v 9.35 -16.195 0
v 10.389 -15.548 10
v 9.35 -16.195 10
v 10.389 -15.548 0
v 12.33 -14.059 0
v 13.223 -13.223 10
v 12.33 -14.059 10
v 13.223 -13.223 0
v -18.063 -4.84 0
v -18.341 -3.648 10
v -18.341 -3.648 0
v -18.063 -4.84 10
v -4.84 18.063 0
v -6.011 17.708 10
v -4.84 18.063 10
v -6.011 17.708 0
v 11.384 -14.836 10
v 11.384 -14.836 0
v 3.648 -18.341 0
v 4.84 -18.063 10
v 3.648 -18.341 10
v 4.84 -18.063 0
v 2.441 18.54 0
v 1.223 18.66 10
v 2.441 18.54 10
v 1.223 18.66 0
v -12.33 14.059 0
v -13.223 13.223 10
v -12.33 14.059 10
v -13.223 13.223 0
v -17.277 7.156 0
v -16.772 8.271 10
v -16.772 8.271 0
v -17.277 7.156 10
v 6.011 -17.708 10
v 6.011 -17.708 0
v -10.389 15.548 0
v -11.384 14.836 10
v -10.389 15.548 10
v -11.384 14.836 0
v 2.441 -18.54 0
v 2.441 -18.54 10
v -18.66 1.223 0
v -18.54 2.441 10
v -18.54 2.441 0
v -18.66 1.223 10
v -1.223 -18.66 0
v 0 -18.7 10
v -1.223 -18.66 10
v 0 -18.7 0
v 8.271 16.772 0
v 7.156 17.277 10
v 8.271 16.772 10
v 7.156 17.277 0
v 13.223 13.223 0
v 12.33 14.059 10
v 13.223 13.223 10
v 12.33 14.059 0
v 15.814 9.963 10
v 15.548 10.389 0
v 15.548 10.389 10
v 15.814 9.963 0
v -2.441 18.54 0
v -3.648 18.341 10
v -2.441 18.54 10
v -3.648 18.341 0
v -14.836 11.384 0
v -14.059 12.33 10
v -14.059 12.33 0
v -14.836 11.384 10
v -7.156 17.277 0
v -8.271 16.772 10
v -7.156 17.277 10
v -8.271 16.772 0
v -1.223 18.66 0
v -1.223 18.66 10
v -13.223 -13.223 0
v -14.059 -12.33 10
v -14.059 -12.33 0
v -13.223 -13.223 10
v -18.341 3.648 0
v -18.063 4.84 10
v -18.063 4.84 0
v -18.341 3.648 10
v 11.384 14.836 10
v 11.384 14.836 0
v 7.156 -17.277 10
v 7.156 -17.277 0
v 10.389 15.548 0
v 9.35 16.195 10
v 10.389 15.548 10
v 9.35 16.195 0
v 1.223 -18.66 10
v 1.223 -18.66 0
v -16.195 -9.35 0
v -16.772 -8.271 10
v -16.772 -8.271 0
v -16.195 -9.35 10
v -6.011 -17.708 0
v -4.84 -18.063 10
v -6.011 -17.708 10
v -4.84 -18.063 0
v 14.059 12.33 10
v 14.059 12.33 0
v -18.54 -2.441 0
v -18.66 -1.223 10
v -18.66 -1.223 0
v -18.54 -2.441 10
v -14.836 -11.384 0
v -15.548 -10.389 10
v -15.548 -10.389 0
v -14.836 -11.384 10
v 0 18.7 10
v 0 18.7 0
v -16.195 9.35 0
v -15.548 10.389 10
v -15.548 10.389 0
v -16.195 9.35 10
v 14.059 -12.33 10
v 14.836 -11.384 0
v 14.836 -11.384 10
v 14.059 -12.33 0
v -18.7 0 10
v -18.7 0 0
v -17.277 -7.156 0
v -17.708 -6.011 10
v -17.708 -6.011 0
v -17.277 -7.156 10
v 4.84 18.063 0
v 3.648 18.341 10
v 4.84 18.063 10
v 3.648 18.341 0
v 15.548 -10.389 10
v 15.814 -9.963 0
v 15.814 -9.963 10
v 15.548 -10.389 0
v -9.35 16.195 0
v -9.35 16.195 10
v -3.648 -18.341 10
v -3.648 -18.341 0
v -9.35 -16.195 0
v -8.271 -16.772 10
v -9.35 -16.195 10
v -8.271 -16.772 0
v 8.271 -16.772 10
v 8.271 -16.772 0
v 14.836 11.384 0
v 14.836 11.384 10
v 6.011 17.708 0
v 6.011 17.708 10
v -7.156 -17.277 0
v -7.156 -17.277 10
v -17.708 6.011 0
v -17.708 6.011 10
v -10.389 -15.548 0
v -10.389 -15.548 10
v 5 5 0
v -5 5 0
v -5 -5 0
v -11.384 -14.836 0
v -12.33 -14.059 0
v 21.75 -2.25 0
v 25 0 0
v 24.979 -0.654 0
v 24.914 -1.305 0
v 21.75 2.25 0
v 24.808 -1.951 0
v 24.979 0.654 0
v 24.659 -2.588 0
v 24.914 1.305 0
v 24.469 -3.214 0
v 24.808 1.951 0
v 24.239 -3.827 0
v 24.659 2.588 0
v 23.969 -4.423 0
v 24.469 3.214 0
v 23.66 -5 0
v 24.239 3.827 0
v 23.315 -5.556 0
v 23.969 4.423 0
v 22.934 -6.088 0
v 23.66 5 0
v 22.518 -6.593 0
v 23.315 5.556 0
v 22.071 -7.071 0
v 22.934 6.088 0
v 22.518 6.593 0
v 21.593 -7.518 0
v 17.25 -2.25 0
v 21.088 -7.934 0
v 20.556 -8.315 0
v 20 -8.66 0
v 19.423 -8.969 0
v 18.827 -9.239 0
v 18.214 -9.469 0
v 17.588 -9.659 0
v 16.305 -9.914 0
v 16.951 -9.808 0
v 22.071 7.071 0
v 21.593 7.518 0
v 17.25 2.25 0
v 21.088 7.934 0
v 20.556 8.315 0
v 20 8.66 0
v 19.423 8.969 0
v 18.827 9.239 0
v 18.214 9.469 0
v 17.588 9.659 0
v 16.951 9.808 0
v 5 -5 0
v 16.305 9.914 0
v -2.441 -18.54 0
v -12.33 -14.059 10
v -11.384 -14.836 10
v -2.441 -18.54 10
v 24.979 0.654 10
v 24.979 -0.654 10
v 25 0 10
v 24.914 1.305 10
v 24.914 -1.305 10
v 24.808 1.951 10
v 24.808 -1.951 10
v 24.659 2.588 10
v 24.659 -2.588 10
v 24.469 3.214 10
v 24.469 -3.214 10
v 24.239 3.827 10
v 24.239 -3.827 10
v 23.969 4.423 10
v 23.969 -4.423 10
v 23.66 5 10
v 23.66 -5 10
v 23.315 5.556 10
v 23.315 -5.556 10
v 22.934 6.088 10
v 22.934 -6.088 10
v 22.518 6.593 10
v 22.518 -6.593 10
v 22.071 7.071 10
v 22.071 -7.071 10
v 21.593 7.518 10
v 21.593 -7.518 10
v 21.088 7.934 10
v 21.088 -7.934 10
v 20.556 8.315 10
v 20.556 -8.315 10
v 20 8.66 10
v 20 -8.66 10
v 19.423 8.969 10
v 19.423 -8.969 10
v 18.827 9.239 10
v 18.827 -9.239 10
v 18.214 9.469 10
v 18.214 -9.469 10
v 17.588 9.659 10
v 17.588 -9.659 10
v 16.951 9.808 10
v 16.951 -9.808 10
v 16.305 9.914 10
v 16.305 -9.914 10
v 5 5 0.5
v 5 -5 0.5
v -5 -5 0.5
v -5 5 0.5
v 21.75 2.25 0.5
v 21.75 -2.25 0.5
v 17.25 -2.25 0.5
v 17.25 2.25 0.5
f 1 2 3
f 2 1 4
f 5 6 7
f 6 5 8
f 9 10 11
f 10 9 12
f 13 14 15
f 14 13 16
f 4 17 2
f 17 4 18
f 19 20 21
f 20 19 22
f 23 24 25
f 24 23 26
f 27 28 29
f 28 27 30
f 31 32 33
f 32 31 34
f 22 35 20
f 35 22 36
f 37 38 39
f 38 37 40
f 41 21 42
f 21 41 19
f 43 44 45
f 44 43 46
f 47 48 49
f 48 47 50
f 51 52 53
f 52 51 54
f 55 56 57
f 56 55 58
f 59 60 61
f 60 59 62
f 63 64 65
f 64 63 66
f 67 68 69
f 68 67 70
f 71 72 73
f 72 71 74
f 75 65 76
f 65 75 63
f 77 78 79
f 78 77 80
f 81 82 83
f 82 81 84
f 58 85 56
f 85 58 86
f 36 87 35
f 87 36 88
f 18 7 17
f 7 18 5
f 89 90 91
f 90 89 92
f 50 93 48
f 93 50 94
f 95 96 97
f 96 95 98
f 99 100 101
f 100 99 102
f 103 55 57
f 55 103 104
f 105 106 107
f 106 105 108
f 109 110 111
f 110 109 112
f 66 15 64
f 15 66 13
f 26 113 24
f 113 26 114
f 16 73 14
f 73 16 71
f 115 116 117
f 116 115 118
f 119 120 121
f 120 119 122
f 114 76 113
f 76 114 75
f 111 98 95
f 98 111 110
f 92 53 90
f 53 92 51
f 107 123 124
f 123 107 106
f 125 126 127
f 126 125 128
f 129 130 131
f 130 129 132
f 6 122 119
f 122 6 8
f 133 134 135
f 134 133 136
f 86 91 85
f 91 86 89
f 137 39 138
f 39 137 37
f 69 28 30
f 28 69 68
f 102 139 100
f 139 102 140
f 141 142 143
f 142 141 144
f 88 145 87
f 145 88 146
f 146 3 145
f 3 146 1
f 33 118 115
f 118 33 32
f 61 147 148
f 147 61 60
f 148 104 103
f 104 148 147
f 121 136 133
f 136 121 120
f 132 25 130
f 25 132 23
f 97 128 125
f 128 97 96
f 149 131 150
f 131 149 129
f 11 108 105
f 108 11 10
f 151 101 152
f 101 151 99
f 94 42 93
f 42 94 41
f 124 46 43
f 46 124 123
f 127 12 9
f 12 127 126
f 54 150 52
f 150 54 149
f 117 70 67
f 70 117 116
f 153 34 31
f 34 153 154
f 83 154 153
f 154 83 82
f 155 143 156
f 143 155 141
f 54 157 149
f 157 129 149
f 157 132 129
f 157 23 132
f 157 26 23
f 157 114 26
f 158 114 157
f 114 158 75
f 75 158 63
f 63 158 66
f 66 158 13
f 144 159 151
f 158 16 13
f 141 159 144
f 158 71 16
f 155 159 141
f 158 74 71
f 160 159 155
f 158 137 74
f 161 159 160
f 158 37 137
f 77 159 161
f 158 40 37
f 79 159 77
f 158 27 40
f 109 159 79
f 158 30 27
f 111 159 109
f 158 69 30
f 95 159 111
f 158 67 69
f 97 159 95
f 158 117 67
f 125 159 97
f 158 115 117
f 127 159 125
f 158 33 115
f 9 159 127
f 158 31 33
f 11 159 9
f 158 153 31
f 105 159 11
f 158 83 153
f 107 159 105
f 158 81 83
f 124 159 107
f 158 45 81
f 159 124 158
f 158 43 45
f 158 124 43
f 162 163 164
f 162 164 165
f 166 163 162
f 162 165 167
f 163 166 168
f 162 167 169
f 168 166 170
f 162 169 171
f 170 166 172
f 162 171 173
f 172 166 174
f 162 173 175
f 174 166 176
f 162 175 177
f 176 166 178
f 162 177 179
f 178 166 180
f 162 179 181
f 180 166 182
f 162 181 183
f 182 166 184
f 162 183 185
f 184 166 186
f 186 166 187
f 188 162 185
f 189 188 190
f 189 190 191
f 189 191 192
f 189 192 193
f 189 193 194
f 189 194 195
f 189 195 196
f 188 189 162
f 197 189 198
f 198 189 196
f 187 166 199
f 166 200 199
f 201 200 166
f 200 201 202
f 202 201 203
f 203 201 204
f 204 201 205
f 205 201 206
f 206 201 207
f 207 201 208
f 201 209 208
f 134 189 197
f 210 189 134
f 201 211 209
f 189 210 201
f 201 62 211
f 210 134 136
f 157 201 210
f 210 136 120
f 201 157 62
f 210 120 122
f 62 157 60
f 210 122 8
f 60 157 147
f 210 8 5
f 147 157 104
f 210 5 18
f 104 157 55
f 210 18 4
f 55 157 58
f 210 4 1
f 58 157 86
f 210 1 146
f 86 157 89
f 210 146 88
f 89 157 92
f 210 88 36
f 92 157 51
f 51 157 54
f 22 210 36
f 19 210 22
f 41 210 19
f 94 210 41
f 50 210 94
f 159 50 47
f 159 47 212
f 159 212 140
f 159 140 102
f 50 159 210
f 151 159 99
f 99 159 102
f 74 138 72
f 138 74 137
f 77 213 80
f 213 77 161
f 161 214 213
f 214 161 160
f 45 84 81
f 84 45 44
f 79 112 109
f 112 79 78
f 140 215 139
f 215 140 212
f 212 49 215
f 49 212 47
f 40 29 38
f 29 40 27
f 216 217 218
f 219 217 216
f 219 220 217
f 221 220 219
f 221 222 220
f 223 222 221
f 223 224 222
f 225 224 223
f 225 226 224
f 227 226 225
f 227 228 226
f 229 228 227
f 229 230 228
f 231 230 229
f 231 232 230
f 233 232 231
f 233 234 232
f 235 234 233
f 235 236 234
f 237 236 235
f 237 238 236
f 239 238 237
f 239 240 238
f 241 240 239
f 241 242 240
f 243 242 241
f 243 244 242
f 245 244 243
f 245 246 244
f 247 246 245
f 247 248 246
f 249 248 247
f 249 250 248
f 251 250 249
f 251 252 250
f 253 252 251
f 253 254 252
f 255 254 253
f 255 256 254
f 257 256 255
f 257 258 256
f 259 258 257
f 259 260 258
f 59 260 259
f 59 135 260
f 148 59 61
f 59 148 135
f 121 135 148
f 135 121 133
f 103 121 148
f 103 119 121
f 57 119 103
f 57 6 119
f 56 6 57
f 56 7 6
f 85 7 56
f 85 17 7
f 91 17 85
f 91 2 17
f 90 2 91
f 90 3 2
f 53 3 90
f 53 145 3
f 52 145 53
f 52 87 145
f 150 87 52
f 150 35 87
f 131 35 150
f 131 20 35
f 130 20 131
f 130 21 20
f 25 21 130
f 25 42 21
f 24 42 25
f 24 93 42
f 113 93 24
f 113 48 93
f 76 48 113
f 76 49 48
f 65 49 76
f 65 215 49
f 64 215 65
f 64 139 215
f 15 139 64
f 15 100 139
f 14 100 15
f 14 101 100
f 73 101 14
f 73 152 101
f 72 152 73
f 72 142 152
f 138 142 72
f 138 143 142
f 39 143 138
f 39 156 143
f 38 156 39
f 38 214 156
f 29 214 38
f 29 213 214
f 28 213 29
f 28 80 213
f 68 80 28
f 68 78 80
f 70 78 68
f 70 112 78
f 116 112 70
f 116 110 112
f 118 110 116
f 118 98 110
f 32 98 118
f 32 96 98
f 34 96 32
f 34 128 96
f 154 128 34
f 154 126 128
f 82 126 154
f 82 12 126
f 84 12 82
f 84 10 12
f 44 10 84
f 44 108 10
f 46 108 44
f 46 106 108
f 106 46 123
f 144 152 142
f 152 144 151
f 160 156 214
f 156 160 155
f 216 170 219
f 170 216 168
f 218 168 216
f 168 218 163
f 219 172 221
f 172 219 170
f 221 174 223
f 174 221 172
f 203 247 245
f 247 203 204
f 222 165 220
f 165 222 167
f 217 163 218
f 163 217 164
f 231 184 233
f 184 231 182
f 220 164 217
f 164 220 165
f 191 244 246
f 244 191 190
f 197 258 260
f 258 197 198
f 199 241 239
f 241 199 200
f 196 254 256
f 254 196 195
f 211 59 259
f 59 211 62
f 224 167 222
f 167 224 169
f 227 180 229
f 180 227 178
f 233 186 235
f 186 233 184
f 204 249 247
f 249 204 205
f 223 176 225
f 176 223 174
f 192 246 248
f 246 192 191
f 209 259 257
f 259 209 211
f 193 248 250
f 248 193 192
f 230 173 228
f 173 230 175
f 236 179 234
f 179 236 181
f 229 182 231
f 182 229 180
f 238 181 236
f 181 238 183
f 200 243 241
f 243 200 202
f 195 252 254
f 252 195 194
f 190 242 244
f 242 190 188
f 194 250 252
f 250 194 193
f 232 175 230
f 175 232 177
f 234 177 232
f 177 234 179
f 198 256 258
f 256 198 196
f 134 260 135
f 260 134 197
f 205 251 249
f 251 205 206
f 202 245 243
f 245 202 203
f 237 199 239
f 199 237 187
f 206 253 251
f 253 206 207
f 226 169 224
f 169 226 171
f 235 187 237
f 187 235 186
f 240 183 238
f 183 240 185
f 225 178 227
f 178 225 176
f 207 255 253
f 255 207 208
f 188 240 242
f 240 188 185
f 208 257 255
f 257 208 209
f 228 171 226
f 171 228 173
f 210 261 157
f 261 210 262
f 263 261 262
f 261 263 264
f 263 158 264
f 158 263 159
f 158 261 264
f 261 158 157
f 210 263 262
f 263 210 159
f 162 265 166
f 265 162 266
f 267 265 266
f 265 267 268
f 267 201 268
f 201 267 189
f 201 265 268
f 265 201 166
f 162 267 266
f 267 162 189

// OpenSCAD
// Snap-on tubing clip for a 12.7 mm lab stand rod
// Print orientation: flat on the bed, z = 0 up to z = 10

// ---- Stand rod ----
stand_d     = 12.7;   // stand rod diameter
stand_open  = 10;      // width of the opening cut into the stand ring
stand_r     = stand_d + 2 * 3;  // stand ring outer radius (3 mm wall)

// ---- Tubing ring ----
tube_d      = 6;       // tubing inner diameter
tube_r      = tube_d + 2 * 2;      // tubing ring outer radius (2 mm wall)
tube_x      = 15;      // tubing ring centre X
tube_open_w = 4.5;     // width of the opening cut into the tubing ring

// ---- Bridge ----
bridge_w    = 6;       // bridge width (Y)
bridge_x0   = 8;       // bridge start (X)
bridge_x1   = 12;      // bridge end (X)

// ---- Misc ----
eps         = 0.5;     // cutter overshoot past faces
$fn         = 96;      // curve resolution

difference() {
    union() {
        // Stand ring
        cylinder(r = stand_r, h = 10);
        // Tubing ring
        translate([tube_x, 0, 0])
            cylinder(r = tube_r, h = 10);
        // Solid bridge
        translate([bridge_x0, -bridge_w / 2, 0])
            cube([bridge_x1 - bridge_x0, bridge_w, 10]);
    }

    // Opening in stand ring: x < 0 and -5 < y < 5
    translate([-stand_open / 2, -5, -eps])
        cube([stand_open, 10, 2 * eps]);

    // Opening in tubing ring: x > 15 and -2.25 < y < 2.25
    translate([tube_x + tube_open_w / 2, -tube_open_w / 2, -eps])
        cube([tube_open_w, tube_open_w, 2 * eps]);
}
